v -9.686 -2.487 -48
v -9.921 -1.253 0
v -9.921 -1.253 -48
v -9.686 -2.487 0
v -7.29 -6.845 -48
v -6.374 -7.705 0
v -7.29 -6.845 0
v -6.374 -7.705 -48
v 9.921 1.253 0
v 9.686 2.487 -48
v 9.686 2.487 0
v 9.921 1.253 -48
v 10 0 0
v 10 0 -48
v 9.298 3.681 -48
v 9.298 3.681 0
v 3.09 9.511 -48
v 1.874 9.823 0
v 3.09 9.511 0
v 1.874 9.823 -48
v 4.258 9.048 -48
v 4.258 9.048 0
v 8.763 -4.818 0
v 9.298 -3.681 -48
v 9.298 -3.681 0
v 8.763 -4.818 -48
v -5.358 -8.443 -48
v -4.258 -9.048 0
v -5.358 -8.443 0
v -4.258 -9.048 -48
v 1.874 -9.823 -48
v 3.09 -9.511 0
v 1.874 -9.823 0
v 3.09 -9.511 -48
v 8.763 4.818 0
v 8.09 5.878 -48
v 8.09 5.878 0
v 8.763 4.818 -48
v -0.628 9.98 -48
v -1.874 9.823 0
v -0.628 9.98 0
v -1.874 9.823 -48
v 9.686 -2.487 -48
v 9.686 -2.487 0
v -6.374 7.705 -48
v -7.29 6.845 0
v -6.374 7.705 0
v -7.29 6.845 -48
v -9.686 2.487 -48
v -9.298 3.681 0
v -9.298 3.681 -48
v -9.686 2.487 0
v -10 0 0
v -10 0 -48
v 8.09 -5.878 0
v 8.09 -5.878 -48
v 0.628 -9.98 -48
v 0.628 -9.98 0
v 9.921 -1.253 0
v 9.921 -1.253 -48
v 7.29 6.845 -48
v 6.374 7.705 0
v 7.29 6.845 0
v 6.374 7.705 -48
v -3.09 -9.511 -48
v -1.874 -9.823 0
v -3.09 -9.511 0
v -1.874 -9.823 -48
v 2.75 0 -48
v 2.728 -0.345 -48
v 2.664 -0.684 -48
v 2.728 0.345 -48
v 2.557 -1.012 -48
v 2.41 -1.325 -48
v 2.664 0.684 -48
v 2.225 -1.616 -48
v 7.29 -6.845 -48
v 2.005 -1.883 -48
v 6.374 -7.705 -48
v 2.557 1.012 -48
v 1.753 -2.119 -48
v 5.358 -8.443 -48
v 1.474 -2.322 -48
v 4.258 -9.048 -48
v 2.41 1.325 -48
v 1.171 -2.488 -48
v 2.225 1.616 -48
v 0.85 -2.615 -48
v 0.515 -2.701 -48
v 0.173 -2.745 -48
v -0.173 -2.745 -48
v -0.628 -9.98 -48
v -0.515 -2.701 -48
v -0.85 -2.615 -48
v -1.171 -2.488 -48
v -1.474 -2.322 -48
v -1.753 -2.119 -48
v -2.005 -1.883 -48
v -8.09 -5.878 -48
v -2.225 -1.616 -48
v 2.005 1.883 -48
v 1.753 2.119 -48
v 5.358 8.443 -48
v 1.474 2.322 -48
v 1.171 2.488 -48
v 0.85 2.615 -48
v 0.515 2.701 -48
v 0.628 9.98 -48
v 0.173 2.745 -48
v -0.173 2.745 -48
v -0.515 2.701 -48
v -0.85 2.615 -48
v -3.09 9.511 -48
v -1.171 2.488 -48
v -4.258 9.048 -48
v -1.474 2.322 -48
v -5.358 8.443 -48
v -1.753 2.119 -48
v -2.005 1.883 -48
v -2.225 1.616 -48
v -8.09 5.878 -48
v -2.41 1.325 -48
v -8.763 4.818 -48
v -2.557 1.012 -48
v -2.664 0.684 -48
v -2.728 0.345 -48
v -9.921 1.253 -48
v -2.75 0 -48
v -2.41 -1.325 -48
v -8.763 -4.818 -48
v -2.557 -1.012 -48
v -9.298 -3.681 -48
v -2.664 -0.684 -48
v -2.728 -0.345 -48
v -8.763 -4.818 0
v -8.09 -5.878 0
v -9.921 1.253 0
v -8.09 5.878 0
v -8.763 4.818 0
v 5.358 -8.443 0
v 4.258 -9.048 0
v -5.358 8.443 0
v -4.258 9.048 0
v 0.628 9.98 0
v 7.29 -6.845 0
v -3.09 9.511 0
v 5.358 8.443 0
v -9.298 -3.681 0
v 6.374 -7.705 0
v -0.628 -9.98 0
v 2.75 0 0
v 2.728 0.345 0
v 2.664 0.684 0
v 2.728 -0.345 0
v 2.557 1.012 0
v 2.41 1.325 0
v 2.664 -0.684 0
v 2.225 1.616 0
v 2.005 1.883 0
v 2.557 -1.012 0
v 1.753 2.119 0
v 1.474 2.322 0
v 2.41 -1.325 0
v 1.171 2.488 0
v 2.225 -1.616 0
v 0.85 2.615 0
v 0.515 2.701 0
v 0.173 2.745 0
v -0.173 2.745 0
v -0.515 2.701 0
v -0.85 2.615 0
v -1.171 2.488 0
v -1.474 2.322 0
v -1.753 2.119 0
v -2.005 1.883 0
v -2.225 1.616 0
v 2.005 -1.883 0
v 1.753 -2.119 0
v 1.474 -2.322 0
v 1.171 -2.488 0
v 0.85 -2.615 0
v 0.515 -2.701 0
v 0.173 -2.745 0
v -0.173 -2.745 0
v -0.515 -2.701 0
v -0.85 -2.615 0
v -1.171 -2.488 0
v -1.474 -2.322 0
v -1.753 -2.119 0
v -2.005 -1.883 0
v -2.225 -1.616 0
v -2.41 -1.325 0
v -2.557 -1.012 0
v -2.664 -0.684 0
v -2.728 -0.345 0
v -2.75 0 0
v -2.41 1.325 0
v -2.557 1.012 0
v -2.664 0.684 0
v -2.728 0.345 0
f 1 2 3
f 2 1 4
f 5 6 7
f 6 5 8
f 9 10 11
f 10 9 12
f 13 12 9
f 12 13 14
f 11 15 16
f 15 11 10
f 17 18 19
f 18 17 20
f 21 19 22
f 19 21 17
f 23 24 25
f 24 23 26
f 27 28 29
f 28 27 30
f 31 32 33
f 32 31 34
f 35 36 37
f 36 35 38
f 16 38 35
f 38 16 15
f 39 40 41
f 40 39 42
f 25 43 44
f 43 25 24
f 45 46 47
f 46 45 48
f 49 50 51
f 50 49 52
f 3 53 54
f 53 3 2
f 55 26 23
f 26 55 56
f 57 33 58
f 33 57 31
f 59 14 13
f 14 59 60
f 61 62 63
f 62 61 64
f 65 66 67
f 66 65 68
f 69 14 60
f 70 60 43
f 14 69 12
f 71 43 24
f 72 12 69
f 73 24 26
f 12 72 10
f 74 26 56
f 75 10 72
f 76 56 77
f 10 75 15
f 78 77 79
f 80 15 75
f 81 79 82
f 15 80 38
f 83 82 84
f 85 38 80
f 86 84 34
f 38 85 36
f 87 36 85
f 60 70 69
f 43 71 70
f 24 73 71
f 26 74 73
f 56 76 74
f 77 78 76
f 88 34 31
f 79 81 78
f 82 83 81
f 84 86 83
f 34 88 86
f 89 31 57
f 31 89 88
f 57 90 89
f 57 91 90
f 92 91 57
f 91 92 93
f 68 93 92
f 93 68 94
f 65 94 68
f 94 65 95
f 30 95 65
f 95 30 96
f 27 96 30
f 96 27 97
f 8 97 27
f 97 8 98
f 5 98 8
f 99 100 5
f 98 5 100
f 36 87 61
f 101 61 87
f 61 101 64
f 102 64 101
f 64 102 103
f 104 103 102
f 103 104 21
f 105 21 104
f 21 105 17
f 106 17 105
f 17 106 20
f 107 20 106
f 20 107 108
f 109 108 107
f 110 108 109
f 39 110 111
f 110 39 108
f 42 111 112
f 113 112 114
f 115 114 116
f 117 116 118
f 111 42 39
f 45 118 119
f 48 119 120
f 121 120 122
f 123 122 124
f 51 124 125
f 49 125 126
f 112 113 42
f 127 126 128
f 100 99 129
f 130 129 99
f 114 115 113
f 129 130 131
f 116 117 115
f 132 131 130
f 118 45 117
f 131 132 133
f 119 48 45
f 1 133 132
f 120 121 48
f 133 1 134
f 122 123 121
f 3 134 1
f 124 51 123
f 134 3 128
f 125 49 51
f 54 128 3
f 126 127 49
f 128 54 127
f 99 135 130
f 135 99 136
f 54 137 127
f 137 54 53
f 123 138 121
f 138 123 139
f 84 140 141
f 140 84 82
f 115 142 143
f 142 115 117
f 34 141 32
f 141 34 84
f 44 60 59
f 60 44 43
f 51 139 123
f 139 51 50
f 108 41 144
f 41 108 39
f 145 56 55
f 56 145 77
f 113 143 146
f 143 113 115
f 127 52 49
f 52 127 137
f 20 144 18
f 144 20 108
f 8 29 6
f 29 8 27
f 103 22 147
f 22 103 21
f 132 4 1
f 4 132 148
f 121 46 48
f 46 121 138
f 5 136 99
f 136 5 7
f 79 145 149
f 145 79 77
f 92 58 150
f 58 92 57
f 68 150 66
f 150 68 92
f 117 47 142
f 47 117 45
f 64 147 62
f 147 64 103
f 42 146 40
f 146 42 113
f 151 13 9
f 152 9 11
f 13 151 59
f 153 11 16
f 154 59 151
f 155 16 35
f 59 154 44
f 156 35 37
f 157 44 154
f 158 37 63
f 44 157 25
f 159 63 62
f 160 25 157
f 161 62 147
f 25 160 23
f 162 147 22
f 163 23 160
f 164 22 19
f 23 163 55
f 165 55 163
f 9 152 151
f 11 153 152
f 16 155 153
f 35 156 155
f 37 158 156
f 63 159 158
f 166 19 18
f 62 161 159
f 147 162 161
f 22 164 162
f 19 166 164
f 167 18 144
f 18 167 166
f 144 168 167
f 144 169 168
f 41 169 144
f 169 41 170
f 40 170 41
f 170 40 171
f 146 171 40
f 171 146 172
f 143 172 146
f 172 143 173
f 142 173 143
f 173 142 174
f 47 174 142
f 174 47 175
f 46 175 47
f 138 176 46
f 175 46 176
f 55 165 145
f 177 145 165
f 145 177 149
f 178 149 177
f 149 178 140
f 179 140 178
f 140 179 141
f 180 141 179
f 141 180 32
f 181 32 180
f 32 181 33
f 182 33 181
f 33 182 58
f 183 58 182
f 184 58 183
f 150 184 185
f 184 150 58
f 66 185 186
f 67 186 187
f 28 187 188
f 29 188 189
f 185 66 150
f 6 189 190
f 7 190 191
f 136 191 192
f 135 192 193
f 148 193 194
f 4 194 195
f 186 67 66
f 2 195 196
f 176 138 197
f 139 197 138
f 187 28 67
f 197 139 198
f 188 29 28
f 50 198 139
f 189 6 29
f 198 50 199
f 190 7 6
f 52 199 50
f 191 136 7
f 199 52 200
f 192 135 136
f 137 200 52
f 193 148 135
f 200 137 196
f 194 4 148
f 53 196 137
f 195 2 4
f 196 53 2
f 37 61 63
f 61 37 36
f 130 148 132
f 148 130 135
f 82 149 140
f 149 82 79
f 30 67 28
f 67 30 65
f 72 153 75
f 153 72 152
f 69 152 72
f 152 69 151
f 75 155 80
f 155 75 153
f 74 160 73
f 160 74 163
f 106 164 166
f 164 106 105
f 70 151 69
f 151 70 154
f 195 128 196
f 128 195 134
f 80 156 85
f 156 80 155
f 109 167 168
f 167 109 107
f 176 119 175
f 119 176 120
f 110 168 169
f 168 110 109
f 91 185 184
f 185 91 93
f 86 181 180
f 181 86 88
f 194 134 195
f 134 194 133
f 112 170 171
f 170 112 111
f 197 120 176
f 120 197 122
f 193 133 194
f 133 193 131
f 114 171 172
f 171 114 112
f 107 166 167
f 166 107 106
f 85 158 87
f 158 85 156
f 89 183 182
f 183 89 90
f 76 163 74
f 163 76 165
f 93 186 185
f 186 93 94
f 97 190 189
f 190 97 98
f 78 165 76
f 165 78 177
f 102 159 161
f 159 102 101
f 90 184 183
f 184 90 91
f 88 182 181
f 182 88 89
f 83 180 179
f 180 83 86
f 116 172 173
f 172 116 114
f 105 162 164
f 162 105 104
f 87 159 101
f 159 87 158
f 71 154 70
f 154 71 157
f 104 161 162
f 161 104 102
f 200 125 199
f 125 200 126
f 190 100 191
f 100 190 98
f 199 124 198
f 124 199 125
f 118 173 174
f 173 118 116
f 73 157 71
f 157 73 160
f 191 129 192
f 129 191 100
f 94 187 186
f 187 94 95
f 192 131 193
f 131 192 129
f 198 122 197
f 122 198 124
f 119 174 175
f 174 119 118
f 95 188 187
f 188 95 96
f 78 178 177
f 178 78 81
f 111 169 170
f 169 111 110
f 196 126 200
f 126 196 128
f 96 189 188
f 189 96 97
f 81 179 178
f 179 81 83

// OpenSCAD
$fn = 50;


difference() {
	union() {
		translate(v = [0, 0, -48.0000000000]) {
			cylinder(h = 48, r = 10.0000000000);
		}
		cylinder(h = 0, r = 19.0000000000);
	}
	union() {
		#translate(v = [0, 0, -48]) {
			cylinder(h = 48, r = 2.7500000000);
		}
	}
}
